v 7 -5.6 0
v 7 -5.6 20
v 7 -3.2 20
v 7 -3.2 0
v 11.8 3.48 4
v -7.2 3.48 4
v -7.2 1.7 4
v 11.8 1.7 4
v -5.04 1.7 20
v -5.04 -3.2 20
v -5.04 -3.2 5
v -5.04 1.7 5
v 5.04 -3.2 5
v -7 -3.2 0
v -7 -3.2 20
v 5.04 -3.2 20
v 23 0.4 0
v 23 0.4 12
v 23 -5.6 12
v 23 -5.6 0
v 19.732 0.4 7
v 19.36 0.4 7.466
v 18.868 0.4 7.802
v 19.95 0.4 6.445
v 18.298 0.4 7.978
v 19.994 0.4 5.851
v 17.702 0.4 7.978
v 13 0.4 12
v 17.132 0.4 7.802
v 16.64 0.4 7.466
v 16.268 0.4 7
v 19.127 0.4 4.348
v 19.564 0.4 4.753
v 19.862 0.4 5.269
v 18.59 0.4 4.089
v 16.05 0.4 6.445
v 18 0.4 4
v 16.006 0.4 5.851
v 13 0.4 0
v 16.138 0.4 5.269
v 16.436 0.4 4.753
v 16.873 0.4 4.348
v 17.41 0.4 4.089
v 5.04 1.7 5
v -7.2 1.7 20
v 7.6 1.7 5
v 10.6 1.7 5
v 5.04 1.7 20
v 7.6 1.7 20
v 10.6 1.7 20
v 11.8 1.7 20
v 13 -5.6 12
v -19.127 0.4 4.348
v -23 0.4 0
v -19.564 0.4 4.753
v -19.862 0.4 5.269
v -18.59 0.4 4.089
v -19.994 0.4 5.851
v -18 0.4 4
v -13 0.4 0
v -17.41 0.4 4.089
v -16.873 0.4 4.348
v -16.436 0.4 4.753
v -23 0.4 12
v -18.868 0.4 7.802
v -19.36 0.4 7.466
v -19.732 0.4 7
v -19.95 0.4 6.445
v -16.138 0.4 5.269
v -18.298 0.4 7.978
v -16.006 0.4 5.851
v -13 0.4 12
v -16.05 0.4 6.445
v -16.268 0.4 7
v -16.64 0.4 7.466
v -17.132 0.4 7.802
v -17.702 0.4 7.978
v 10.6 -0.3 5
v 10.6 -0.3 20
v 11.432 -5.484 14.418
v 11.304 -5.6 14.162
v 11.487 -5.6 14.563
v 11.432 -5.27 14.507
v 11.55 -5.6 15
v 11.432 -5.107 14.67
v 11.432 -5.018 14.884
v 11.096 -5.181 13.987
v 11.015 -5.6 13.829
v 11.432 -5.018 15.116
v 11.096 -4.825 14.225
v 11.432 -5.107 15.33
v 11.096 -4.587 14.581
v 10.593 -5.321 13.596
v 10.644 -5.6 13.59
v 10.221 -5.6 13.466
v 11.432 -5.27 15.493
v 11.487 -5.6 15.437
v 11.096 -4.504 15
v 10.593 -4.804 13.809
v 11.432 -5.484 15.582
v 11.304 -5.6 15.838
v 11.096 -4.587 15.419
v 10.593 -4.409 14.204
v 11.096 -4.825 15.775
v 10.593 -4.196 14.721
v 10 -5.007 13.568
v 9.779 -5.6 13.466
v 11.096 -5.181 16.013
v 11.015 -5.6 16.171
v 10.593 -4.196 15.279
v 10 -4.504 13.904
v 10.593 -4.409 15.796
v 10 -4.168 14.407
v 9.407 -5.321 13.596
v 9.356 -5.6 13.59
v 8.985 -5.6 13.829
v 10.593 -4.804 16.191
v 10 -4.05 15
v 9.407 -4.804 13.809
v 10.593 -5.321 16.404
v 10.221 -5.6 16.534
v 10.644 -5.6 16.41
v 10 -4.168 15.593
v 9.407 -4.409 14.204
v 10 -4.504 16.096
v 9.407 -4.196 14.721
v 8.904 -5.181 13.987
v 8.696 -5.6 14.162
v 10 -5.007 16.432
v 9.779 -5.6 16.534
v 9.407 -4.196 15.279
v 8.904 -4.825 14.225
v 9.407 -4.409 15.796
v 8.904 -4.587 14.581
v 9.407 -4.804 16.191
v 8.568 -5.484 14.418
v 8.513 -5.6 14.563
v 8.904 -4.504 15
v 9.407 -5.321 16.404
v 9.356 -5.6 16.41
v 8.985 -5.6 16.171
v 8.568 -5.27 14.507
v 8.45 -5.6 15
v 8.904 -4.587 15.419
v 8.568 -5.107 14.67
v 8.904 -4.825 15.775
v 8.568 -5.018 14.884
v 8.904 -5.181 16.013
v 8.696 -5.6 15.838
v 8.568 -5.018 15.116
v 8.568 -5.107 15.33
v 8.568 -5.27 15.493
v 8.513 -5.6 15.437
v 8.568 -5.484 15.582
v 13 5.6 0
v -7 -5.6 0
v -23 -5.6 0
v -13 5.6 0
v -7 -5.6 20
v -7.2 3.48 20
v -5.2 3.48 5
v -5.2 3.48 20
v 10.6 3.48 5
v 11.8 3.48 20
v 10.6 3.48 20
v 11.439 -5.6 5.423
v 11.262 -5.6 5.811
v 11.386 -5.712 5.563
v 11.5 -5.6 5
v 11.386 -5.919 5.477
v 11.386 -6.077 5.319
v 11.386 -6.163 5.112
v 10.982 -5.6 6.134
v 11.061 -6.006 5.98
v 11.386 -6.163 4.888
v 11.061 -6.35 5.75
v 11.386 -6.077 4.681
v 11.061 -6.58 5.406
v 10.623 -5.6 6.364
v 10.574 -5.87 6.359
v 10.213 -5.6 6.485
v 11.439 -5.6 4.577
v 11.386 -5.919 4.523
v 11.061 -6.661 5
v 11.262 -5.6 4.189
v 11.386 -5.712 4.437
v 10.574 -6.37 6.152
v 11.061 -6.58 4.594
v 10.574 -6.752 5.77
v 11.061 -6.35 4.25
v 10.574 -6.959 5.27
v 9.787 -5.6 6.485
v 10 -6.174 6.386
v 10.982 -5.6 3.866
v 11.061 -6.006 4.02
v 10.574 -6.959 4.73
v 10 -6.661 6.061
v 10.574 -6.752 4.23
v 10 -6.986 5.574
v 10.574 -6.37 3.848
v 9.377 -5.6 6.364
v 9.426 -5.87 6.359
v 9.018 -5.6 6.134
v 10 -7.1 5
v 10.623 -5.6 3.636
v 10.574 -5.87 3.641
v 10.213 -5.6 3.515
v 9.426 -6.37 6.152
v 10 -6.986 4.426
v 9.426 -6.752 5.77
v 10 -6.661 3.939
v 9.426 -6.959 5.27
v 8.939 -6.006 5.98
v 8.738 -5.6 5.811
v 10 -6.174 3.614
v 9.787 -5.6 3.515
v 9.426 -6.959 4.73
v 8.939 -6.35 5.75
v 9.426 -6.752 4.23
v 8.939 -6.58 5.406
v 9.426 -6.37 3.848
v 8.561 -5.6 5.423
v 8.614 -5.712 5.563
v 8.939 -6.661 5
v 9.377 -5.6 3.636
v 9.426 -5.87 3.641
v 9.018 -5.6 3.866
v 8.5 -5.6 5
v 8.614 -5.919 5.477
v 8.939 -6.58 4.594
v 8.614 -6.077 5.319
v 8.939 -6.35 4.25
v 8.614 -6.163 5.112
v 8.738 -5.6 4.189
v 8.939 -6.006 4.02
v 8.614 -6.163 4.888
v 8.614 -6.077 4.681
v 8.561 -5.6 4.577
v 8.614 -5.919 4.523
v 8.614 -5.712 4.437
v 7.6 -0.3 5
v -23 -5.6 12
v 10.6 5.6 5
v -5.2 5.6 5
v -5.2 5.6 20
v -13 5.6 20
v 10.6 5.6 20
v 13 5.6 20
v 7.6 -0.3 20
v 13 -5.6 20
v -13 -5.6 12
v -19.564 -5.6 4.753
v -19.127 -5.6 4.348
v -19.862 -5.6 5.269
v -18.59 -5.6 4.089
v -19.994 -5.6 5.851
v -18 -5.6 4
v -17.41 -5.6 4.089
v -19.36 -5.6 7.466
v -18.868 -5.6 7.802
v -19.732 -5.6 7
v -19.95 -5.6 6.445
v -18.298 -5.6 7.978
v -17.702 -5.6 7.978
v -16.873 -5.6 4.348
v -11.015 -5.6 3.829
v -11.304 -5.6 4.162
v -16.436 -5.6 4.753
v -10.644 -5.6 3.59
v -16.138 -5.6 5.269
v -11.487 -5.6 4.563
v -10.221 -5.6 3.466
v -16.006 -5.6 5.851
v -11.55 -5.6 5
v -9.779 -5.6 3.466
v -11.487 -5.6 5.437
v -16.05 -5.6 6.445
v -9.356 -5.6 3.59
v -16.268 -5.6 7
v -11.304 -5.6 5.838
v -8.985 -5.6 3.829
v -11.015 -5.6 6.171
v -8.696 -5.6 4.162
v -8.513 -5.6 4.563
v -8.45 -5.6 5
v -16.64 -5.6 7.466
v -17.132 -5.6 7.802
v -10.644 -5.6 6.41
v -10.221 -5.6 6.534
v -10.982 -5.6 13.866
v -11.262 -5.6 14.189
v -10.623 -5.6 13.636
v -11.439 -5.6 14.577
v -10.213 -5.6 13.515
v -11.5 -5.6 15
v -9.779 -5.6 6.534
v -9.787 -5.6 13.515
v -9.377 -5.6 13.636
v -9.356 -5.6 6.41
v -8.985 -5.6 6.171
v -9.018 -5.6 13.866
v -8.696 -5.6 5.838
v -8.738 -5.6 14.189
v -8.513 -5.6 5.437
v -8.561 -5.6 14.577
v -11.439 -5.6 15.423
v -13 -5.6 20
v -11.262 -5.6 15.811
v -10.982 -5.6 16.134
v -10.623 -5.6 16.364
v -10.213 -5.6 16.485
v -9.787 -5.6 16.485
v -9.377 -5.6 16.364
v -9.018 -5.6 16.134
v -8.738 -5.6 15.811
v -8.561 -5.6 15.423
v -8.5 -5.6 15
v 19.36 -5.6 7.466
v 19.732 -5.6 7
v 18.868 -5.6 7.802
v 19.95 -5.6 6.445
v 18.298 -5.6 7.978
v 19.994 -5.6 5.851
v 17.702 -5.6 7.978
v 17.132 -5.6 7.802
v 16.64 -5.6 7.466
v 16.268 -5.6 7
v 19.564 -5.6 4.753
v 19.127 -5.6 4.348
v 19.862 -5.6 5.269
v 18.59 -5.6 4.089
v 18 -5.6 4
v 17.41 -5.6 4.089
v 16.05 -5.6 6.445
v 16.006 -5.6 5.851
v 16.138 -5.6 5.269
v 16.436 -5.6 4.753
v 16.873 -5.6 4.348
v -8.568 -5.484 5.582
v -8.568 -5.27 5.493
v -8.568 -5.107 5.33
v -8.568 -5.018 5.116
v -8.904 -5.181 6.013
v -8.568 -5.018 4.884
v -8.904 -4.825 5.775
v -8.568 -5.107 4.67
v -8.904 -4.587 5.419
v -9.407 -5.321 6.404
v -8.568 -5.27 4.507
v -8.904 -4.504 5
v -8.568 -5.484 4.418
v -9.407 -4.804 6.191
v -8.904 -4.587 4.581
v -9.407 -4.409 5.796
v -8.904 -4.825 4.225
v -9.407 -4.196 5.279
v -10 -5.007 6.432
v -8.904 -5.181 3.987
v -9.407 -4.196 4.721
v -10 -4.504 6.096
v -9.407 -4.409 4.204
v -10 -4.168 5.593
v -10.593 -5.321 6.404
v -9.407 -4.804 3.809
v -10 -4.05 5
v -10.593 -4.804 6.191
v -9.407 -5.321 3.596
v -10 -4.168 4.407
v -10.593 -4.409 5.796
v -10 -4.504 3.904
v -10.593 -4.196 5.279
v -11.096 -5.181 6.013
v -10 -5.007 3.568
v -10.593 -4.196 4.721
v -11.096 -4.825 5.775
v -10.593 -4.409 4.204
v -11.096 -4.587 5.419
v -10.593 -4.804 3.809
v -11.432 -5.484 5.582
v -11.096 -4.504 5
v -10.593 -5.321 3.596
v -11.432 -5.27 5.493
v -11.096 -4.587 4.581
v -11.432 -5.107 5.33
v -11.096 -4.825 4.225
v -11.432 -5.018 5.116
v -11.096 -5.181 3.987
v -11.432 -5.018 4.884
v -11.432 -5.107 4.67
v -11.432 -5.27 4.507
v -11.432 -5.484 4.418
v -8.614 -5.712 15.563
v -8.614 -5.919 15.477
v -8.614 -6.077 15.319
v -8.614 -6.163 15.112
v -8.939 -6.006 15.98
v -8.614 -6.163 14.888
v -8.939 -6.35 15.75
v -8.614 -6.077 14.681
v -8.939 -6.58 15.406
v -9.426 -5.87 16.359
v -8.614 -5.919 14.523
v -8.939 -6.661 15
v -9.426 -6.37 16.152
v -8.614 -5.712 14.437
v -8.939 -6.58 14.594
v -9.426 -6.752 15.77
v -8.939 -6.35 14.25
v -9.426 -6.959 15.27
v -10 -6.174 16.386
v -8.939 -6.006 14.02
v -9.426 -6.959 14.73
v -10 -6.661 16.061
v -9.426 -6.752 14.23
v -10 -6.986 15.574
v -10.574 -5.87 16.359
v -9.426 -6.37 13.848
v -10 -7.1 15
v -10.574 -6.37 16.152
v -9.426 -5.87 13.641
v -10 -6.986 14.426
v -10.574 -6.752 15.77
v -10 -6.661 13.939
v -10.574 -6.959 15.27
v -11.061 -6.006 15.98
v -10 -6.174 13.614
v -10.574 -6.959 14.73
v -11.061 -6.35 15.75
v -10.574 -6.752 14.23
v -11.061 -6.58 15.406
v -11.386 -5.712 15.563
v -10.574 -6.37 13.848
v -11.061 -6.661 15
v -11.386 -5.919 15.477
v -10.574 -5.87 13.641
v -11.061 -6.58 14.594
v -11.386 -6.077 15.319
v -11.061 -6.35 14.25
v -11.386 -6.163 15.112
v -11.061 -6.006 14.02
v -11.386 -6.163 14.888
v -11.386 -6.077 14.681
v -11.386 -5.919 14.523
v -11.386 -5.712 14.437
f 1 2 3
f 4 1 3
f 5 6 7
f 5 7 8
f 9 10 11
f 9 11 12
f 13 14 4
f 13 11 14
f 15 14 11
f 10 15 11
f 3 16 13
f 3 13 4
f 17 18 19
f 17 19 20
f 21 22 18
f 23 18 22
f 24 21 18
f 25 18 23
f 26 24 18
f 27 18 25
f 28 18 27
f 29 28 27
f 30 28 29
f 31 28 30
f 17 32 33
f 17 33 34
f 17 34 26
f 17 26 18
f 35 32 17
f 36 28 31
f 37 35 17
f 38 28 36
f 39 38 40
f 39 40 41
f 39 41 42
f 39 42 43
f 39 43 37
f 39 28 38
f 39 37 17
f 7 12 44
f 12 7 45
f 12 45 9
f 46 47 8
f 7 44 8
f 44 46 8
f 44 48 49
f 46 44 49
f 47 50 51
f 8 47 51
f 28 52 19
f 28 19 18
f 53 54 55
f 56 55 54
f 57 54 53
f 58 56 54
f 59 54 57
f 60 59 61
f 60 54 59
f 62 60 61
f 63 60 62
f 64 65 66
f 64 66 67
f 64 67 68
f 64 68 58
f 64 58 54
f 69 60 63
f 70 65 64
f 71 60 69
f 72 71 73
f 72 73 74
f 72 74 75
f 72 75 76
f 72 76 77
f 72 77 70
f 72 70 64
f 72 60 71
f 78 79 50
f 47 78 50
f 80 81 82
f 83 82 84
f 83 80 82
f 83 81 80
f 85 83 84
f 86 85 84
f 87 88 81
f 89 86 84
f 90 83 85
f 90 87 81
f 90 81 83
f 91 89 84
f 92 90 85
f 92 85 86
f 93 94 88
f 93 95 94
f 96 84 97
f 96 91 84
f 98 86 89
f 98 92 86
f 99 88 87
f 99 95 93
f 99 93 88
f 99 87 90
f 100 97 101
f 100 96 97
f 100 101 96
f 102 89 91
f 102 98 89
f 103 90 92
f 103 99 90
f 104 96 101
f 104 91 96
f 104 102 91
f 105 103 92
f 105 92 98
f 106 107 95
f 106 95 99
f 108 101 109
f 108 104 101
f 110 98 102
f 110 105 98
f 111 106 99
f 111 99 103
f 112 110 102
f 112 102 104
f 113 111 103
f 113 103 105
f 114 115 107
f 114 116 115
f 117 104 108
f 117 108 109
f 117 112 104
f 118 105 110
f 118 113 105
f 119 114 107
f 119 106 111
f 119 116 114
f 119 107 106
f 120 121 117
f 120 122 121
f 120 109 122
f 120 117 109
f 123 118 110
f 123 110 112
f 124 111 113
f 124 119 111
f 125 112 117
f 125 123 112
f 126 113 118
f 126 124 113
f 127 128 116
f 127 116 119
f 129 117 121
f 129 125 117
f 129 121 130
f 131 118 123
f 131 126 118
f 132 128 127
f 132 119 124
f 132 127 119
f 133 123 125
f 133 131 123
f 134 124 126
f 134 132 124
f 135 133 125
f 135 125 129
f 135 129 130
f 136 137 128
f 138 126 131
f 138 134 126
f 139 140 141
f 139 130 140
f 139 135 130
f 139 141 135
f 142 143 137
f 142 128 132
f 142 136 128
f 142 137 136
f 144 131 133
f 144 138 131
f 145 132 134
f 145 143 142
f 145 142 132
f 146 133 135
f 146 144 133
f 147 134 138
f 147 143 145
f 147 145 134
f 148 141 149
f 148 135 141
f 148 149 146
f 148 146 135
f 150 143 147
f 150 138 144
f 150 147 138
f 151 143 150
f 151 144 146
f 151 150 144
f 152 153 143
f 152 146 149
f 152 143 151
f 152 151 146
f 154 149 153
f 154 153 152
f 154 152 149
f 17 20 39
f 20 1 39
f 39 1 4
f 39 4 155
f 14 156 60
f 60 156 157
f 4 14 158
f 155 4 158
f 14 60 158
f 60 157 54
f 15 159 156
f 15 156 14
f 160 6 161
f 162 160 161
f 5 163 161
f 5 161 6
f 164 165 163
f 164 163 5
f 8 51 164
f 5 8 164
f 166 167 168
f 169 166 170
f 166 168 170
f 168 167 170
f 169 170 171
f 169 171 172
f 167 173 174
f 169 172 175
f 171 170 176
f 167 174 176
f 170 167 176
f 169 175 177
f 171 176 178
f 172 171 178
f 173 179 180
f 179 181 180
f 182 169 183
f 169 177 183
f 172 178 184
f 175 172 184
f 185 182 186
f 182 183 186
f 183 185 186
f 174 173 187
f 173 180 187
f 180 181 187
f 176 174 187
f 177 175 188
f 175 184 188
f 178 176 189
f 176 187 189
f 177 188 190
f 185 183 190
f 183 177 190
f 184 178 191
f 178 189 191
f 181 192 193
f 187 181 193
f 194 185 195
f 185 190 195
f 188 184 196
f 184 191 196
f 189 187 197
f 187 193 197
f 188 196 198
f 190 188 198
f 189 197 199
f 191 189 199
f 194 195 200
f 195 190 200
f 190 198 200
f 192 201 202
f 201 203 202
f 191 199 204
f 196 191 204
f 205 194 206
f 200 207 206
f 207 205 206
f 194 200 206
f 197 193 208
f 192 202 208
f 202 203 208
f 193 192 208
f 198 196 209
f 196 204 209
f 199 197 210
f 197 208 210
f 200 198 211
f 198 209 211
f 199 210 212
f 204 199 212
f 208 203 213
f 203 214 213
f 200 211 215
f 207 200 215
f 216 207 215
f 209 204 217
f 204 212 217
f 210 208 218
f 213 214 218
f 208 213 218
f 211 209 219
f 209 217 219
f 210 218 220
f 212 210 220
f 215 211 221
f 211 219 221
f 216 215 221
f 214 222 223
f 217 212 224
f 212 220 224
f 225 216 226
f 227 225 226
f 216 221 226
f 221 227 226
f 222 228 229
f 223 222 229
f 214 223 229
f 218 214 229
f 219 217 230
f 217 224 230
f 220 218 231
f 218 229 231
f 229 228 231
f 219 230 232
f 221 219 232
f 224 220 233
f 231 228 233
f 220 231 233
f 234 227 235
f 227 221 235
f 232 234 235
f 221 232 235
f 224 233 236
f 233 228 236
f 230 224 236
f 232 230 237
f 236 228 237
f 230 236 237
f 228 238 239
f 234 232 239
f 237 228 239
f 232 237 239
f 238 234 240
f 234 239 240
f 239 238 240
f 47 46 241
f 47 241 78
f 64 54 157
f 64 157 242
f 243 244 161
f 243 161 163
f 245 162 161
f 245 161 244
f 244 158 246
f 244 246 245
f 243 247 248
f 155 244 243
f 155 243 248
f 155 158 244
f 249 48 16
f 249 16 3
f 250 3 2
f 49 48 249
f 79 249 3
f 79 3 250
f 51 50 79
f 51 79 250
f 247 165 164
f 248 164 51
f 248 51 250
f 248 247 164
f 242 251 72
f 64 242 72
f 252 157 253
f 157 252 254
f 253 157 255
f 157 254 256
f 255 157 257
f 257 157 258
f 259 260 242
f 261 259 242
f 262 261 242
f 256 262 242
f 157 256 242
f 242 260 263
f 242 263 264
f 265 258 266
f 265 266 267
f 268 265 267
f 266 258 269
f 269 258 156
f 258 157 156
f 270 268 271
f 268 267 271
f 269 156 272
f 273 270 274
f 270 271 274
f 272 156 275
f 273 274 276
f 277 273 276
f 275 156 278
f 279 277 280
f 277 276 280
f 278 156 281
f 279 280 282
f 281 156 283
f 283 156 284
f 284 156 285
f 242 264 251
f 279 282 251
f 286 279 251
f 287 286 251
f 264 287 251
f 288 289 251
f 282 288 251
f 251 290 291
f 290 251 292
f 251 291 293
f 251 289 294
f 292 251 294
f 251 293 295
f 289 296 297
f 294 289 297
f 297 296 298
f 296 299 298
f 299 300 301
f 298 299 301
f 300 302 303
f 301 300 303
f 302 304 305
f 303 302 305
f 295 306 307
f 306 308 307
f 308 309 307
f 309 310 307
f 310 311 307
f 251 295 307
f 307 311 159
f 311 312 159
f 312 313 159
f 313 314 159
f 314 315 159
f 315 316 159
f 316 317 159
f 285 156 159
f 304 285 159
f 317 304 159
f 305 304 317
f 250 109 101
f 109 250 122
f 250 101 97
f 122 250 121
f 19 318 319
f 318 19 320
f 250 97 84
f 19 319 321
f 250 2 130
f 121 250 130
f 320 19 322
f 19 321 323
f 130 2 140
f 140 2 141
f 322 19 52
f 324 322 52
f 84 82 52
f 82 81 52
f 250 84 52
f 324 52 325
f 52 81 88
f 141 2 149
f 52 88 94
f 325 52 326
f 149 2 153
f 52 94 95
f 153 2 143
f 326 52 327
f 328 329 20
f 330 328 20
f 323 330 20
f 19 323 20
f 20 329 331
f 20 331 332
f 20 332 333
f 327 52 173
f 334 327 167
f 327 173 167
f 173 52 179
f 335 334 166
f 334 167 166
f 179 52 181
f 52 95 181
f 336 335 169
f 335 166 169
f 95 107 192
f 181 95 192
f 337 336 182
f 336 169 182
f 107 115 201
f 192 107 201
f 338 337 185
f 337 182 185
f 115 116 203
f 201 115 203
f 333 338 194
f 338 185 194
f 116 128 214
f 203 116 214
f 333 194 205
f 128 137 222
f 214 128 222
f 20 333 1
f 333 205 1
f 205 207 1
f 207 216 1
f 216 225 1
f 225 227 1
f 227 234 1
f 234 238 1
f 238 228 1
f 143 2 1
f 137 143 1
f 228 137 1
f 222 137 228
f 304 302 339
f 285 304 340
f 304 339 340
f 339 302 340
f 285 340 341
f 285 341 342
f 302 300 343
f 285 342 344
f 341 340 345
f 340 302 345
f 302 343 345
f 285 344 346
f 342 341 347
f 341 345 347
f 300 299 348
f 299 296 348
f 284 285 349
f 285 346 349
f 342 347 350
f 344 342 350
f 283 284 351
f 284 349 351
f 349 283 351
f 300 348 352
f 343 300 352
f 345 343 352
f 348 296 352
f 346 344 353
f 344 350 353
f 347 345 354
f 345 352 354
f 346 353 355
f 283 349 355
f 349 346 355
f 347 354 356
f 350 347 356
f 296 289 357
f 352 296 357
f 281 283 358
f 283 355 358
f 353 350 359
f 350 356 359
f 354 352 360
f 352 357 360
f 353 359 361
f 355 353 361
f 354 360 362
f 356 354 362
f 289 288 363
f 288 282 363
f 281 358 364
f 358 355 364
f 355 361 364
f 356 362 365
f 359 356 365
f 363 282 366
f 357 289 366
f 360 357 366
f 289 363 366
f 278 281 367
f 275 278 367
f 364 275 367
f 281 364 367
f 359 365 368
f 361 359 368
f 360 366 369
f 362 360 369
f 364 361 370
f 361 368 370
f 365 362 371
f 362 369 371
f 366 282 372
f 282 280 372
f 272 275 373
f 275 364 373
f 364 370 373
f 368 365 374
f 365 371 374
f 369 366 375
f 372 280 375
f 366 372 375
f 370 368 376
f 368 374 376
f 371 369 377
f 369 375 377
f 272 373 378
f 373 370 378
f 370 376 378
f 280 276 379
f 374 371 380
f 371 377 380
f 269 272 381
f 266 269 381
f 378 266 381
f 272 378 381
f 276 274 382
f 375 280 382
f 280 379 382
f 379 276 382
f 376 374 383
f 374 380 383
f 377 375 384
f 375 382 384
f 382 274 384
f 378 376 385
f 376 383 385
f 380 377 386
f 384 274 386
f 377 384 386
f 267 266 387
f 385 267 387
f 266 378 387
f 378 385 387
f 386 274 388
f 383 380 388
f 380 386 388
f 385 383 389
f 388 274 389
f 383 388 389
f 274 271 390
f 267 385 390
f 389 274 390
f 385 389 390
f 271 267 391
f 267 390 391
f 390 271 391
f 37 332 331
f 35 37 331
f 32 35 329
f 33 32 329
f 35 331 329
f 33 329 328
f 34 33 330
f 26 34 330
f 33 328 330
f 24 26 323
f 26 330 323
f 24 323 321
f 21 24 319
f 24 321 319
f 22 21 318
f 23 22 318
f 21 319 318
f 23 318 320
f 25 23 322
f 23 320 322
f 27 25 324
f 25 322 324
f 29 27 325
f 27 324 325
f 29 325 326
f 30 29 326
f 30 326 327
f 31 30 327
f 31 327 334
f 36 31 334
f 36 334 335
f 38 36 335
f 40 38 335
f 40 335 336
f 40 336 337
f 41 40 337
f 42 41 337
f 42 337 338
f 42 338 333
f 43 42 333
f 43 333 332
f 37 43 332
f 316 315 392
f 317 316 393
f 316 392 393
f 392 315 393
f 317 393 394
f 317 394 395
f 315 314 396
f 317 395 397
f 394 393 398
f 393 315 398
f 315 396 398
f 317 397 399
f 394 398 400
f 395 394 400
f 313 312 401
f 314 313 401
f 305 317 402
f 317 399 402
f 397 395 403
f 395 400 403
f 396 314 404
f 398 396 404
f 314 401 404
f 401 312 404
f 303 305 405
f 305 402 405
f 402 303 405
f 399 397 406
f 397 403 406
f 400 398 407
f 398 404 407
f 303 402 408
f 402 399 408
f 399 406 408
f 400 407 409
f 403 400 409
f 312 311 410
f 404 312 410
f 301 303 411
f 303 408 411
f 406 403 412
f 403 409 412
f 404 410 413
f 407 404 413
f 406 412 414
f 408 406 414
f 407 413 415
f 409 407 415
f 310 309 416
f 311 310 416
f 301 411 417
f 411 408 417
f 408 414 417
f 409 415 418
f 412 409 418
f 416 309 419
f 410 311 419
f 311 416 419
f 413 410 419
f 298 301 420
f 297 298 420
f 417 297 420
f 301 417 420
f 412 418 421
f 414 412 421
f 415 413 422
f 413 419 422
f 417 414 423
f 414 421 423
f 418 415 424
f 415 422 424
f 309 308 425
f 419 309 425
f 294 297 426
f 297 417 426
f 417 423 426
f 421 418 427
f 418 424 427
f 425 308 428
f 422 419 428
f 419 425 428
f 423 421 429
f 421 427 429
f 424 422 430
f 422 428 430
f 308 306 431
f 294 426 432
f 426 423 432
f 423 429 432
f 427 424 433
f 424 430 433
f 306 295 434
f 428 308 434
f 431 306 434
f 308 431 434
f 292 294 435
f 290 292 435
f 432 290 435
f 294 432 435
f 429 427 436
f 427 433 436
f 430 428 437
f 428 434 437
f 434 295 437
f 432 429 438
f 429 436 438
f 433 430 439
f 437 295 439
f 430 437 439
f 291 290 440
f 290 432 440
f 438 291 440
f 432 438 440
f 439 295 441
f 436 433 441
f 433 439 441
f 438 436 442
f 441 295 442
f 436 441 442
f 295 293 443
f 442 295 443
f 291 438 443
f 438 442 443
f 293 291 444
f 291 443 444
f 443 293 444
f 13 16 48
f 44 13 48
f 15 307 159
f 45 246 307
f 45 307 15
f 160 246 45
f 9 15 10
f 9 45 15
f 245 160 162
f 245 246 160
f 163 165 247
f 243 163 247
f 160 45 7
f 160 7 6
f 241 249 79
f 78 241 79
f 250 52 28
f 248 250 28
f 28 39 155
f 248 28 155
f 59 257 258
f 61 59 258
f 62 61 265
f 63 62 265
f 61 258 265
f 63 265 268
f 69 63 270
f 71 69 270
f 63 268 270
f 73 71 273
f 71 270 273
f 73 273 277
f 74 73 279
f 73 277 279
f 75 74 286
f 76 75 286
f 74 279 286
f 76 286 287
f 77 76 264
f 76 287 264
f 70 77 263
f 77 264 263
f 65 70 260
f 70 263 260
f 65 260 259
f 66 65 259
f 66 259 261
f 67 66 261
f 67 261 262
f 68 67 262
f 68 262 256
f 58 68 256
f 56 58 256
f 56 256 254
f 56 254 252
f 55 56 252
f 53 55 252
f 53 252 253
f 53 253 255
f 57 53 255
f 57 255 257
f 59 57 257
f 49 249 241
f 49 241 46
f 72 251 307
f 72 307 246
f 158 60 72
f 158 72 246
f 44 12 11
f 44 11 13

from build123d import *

# Parameters (mm, degrees)
SKETCH2_W           = 26
SKETCH2_H           = 11.2
BOSS_EXTRUDE1_DEPTH = 20
SKETCH6_W           = 14
SKETCH6_H           = 2.4
CUT_EXTRUDE1_DEPTH  = 20
SKETCH7_W           = 10.08
SKETCH7_H           = 4.9
CUT_EXTRUDE2_DEPTH  = 15
SKETCH8_W           = 19
SKETCH8_H           = 1.78
CUT_EXTRUDE3_DEPTH  = 16
SKETCH9_W           = 15.8
SKETCH9_H           = 2.12
CUT_EXTRUDE4_DEPTH  = 15
SKETCH10_W          = 3
SKETCH10_H          = 2
CUT_EXTRUDE5_DEPTH  = 15
CUT_REVOLVE3_ANGLE  = 180
SKETCH15_W          = 12
SKETCH15_H          = 6
BOSS_EXTRUDE2_DEPTH = 10
SKETCH16_W          = 12
SKETCH16_H          = 6
BOSS_EXTRUDE3_DEPTH = 10
SKETCH17_R          = 2
CUT_EXTRUDE6_DEPTH  = 12
SKETCH18_R          = 2
CUT_EXTRUDE7_DEPTH  = 12


with BuildPart() as part:
    # Sketch2 → Boss-Extrude1 (new body)
    with BuildSketch(Plane.XY):
        Rectangle(SKETCH2_W, SKETCH2_H)
    extrude(amount=BOSS_EXTRUDE1_DEPTH)

    # Sketch6 → Cut-Extrude1 (cut)
    with BuildSketch(Plane.XY.offset(20)):
        with Locations((0, -4.4)):
            Rectangle(SKETCH6_W, SKETCH6_H)
    extrude(amount=-CUT_EXTRUDE1_DEPTH, mode=Mode.SUBTRACT)

    # Sketch7 → Cut-Extrude2 (cut)
    with BuildSketch(Plane.XY.offset(20)):
        with Locations((0, -0.75)):
            Rectangle(SKETCH7_W, SKETCH7_H)
    extrude(amount=-CUT_EXTRUDE2_DEPTH, mode=Mode.SUBTRACT)

    # Sketch8 → Cut-Extrude3 (cut)
    with BuildSketch(Plane.XY.offset(20)):
        with Locations((2.3, 2.59)):
            Rectangle(SKETCH8_W, SKETCH8_H)
    extrude(amount=-CUT_EXTRUDE3_DEPTH, mode=Mode.SUBTRACT)

    # Sketch9 → Cut-Extrude4 (cut)
    with BuildSketch(Plane.XY.offset(20)):
        with Locations((2.7, 4.54)):
            Rectangle(SKETCH9_W, SKETCH9_H)
    extrude(amount=-CUT_EXTRUDE4_DEPTH, mode=Mode.SUBTRACT)

    # Sketch10 → Cut-Extrude5 (cut)
    with BuildSketch(Plane.XY.offset(20)):
        with Locations((9.1, 0.7)):
            Rectangle(SKETCH10_W, SKETCH10_H)
    extrude(amount=-CUT_EXTRUDE5_DEPTH, mode=Mode.SUBTRACT)

    # Sketch11 → Cut-Revolve3 (revolve, cut)
    with BuildSketch(Plane.XZ.offset(5.6)):
        with BuildLine():
            Line((-11.55, 5), (-8.45, 5))
            ThreePointArc((-8.45, 5), (-10, 6.55), (-11.55, 5))
        make_face()
    revolve(axis=Axis((-11.55, -5.6, 5), (-1, 0, 0)), revolution_arc=CUT_REVOLVE3_ANGLE, mode=Mode.SUBTRACT)

    # Sketch12 → Revolve2 (revolve)
    with BuildSketch(Plane.XZ.offset(5.6)):
        with BuildLine():
            Line((-11.5, 15), (-8.5, 15))
            ThreePointArc((-8.5, 15), (-10, 13.5), (-11.5, 15))
        make_face()
    revolve(axis=Axis((-11.5, -5.6, 15), (1, 0, 0)))

    # Sketch14 → Cut-Revolve4 (revolve, cut)
    with BuildSketch(Plane.XZ.offset(5.6)):
        with BuildLine():
            Line((8.45, 15), (11.55, 15))
            ThreePointArc((11.55, 15), (10, 13.45), (8.45, 15))
        make_face()
    revolve(axis=Axis((8.45, -5.6, 15), (1, 0, 0)), mode=Mode.SUBTRACT)

    # Sketch13 → Revolve3 (revolve)
    with BuildSketch(Plane.XZ.offset(5.6)):
        with BuildLine():
            Line((8.5, 5), (11.5, 5))
            ThreePointArc((11.5, 5), (10, 6.5), (8.5, 5))
        make_face()
    revolve(axis=Axis((8.5, -5.6, 5), (1, 0, 0)))

    # Sketch15 → Boss-Extrude2 (add)
    with BuildSketch(Plane.ZY.offset(13)):
        with Locations((6, -2.6)):
            Rectangle(SKETCH15_W, SKETCH15_H)
    extrude(amount=BOSS_EXTRUDE2_DEPTH)

    # Sketch16 → Boss-Extrude3 (add)
    with BuildSketch(Plane(origin=(13, 0, 0), x_dir=(0, 0, -1), z_dir=(1, 0, 0))):
        with Locations((-6, -2.6)):
            Rectangle(SKETCH16_W, SKETCH16_H)
    extrude(amount=BOSS_EXTRUDE3_DEPTH)

    # Sketch17 → Cut-Extrude6 (cut)
    with BuildSketch(Plane.XZ.offset(5.6)):
        with Locations(Location((-18, 6, 0), (0, 0, 270))):
            Circle(SKETCH17_R)
    extrude(amount=-CUT_EXTRUDE6_DEPTH, mode=Mode.SUBTRACT)

    # Sketch18 → Cut-Extrude7 (cut)
    with BuildSketch(Plane.XZ.offset(5.6)):
        with Locations(Location((18, 6, 0), (0, 0, 270))):
            Circle(SKETCH18_R)
    extrude(amount=-CUT_EXTRUDE7_DEPTH, mode=Mode.SUBTRACT)


solid = part.part
